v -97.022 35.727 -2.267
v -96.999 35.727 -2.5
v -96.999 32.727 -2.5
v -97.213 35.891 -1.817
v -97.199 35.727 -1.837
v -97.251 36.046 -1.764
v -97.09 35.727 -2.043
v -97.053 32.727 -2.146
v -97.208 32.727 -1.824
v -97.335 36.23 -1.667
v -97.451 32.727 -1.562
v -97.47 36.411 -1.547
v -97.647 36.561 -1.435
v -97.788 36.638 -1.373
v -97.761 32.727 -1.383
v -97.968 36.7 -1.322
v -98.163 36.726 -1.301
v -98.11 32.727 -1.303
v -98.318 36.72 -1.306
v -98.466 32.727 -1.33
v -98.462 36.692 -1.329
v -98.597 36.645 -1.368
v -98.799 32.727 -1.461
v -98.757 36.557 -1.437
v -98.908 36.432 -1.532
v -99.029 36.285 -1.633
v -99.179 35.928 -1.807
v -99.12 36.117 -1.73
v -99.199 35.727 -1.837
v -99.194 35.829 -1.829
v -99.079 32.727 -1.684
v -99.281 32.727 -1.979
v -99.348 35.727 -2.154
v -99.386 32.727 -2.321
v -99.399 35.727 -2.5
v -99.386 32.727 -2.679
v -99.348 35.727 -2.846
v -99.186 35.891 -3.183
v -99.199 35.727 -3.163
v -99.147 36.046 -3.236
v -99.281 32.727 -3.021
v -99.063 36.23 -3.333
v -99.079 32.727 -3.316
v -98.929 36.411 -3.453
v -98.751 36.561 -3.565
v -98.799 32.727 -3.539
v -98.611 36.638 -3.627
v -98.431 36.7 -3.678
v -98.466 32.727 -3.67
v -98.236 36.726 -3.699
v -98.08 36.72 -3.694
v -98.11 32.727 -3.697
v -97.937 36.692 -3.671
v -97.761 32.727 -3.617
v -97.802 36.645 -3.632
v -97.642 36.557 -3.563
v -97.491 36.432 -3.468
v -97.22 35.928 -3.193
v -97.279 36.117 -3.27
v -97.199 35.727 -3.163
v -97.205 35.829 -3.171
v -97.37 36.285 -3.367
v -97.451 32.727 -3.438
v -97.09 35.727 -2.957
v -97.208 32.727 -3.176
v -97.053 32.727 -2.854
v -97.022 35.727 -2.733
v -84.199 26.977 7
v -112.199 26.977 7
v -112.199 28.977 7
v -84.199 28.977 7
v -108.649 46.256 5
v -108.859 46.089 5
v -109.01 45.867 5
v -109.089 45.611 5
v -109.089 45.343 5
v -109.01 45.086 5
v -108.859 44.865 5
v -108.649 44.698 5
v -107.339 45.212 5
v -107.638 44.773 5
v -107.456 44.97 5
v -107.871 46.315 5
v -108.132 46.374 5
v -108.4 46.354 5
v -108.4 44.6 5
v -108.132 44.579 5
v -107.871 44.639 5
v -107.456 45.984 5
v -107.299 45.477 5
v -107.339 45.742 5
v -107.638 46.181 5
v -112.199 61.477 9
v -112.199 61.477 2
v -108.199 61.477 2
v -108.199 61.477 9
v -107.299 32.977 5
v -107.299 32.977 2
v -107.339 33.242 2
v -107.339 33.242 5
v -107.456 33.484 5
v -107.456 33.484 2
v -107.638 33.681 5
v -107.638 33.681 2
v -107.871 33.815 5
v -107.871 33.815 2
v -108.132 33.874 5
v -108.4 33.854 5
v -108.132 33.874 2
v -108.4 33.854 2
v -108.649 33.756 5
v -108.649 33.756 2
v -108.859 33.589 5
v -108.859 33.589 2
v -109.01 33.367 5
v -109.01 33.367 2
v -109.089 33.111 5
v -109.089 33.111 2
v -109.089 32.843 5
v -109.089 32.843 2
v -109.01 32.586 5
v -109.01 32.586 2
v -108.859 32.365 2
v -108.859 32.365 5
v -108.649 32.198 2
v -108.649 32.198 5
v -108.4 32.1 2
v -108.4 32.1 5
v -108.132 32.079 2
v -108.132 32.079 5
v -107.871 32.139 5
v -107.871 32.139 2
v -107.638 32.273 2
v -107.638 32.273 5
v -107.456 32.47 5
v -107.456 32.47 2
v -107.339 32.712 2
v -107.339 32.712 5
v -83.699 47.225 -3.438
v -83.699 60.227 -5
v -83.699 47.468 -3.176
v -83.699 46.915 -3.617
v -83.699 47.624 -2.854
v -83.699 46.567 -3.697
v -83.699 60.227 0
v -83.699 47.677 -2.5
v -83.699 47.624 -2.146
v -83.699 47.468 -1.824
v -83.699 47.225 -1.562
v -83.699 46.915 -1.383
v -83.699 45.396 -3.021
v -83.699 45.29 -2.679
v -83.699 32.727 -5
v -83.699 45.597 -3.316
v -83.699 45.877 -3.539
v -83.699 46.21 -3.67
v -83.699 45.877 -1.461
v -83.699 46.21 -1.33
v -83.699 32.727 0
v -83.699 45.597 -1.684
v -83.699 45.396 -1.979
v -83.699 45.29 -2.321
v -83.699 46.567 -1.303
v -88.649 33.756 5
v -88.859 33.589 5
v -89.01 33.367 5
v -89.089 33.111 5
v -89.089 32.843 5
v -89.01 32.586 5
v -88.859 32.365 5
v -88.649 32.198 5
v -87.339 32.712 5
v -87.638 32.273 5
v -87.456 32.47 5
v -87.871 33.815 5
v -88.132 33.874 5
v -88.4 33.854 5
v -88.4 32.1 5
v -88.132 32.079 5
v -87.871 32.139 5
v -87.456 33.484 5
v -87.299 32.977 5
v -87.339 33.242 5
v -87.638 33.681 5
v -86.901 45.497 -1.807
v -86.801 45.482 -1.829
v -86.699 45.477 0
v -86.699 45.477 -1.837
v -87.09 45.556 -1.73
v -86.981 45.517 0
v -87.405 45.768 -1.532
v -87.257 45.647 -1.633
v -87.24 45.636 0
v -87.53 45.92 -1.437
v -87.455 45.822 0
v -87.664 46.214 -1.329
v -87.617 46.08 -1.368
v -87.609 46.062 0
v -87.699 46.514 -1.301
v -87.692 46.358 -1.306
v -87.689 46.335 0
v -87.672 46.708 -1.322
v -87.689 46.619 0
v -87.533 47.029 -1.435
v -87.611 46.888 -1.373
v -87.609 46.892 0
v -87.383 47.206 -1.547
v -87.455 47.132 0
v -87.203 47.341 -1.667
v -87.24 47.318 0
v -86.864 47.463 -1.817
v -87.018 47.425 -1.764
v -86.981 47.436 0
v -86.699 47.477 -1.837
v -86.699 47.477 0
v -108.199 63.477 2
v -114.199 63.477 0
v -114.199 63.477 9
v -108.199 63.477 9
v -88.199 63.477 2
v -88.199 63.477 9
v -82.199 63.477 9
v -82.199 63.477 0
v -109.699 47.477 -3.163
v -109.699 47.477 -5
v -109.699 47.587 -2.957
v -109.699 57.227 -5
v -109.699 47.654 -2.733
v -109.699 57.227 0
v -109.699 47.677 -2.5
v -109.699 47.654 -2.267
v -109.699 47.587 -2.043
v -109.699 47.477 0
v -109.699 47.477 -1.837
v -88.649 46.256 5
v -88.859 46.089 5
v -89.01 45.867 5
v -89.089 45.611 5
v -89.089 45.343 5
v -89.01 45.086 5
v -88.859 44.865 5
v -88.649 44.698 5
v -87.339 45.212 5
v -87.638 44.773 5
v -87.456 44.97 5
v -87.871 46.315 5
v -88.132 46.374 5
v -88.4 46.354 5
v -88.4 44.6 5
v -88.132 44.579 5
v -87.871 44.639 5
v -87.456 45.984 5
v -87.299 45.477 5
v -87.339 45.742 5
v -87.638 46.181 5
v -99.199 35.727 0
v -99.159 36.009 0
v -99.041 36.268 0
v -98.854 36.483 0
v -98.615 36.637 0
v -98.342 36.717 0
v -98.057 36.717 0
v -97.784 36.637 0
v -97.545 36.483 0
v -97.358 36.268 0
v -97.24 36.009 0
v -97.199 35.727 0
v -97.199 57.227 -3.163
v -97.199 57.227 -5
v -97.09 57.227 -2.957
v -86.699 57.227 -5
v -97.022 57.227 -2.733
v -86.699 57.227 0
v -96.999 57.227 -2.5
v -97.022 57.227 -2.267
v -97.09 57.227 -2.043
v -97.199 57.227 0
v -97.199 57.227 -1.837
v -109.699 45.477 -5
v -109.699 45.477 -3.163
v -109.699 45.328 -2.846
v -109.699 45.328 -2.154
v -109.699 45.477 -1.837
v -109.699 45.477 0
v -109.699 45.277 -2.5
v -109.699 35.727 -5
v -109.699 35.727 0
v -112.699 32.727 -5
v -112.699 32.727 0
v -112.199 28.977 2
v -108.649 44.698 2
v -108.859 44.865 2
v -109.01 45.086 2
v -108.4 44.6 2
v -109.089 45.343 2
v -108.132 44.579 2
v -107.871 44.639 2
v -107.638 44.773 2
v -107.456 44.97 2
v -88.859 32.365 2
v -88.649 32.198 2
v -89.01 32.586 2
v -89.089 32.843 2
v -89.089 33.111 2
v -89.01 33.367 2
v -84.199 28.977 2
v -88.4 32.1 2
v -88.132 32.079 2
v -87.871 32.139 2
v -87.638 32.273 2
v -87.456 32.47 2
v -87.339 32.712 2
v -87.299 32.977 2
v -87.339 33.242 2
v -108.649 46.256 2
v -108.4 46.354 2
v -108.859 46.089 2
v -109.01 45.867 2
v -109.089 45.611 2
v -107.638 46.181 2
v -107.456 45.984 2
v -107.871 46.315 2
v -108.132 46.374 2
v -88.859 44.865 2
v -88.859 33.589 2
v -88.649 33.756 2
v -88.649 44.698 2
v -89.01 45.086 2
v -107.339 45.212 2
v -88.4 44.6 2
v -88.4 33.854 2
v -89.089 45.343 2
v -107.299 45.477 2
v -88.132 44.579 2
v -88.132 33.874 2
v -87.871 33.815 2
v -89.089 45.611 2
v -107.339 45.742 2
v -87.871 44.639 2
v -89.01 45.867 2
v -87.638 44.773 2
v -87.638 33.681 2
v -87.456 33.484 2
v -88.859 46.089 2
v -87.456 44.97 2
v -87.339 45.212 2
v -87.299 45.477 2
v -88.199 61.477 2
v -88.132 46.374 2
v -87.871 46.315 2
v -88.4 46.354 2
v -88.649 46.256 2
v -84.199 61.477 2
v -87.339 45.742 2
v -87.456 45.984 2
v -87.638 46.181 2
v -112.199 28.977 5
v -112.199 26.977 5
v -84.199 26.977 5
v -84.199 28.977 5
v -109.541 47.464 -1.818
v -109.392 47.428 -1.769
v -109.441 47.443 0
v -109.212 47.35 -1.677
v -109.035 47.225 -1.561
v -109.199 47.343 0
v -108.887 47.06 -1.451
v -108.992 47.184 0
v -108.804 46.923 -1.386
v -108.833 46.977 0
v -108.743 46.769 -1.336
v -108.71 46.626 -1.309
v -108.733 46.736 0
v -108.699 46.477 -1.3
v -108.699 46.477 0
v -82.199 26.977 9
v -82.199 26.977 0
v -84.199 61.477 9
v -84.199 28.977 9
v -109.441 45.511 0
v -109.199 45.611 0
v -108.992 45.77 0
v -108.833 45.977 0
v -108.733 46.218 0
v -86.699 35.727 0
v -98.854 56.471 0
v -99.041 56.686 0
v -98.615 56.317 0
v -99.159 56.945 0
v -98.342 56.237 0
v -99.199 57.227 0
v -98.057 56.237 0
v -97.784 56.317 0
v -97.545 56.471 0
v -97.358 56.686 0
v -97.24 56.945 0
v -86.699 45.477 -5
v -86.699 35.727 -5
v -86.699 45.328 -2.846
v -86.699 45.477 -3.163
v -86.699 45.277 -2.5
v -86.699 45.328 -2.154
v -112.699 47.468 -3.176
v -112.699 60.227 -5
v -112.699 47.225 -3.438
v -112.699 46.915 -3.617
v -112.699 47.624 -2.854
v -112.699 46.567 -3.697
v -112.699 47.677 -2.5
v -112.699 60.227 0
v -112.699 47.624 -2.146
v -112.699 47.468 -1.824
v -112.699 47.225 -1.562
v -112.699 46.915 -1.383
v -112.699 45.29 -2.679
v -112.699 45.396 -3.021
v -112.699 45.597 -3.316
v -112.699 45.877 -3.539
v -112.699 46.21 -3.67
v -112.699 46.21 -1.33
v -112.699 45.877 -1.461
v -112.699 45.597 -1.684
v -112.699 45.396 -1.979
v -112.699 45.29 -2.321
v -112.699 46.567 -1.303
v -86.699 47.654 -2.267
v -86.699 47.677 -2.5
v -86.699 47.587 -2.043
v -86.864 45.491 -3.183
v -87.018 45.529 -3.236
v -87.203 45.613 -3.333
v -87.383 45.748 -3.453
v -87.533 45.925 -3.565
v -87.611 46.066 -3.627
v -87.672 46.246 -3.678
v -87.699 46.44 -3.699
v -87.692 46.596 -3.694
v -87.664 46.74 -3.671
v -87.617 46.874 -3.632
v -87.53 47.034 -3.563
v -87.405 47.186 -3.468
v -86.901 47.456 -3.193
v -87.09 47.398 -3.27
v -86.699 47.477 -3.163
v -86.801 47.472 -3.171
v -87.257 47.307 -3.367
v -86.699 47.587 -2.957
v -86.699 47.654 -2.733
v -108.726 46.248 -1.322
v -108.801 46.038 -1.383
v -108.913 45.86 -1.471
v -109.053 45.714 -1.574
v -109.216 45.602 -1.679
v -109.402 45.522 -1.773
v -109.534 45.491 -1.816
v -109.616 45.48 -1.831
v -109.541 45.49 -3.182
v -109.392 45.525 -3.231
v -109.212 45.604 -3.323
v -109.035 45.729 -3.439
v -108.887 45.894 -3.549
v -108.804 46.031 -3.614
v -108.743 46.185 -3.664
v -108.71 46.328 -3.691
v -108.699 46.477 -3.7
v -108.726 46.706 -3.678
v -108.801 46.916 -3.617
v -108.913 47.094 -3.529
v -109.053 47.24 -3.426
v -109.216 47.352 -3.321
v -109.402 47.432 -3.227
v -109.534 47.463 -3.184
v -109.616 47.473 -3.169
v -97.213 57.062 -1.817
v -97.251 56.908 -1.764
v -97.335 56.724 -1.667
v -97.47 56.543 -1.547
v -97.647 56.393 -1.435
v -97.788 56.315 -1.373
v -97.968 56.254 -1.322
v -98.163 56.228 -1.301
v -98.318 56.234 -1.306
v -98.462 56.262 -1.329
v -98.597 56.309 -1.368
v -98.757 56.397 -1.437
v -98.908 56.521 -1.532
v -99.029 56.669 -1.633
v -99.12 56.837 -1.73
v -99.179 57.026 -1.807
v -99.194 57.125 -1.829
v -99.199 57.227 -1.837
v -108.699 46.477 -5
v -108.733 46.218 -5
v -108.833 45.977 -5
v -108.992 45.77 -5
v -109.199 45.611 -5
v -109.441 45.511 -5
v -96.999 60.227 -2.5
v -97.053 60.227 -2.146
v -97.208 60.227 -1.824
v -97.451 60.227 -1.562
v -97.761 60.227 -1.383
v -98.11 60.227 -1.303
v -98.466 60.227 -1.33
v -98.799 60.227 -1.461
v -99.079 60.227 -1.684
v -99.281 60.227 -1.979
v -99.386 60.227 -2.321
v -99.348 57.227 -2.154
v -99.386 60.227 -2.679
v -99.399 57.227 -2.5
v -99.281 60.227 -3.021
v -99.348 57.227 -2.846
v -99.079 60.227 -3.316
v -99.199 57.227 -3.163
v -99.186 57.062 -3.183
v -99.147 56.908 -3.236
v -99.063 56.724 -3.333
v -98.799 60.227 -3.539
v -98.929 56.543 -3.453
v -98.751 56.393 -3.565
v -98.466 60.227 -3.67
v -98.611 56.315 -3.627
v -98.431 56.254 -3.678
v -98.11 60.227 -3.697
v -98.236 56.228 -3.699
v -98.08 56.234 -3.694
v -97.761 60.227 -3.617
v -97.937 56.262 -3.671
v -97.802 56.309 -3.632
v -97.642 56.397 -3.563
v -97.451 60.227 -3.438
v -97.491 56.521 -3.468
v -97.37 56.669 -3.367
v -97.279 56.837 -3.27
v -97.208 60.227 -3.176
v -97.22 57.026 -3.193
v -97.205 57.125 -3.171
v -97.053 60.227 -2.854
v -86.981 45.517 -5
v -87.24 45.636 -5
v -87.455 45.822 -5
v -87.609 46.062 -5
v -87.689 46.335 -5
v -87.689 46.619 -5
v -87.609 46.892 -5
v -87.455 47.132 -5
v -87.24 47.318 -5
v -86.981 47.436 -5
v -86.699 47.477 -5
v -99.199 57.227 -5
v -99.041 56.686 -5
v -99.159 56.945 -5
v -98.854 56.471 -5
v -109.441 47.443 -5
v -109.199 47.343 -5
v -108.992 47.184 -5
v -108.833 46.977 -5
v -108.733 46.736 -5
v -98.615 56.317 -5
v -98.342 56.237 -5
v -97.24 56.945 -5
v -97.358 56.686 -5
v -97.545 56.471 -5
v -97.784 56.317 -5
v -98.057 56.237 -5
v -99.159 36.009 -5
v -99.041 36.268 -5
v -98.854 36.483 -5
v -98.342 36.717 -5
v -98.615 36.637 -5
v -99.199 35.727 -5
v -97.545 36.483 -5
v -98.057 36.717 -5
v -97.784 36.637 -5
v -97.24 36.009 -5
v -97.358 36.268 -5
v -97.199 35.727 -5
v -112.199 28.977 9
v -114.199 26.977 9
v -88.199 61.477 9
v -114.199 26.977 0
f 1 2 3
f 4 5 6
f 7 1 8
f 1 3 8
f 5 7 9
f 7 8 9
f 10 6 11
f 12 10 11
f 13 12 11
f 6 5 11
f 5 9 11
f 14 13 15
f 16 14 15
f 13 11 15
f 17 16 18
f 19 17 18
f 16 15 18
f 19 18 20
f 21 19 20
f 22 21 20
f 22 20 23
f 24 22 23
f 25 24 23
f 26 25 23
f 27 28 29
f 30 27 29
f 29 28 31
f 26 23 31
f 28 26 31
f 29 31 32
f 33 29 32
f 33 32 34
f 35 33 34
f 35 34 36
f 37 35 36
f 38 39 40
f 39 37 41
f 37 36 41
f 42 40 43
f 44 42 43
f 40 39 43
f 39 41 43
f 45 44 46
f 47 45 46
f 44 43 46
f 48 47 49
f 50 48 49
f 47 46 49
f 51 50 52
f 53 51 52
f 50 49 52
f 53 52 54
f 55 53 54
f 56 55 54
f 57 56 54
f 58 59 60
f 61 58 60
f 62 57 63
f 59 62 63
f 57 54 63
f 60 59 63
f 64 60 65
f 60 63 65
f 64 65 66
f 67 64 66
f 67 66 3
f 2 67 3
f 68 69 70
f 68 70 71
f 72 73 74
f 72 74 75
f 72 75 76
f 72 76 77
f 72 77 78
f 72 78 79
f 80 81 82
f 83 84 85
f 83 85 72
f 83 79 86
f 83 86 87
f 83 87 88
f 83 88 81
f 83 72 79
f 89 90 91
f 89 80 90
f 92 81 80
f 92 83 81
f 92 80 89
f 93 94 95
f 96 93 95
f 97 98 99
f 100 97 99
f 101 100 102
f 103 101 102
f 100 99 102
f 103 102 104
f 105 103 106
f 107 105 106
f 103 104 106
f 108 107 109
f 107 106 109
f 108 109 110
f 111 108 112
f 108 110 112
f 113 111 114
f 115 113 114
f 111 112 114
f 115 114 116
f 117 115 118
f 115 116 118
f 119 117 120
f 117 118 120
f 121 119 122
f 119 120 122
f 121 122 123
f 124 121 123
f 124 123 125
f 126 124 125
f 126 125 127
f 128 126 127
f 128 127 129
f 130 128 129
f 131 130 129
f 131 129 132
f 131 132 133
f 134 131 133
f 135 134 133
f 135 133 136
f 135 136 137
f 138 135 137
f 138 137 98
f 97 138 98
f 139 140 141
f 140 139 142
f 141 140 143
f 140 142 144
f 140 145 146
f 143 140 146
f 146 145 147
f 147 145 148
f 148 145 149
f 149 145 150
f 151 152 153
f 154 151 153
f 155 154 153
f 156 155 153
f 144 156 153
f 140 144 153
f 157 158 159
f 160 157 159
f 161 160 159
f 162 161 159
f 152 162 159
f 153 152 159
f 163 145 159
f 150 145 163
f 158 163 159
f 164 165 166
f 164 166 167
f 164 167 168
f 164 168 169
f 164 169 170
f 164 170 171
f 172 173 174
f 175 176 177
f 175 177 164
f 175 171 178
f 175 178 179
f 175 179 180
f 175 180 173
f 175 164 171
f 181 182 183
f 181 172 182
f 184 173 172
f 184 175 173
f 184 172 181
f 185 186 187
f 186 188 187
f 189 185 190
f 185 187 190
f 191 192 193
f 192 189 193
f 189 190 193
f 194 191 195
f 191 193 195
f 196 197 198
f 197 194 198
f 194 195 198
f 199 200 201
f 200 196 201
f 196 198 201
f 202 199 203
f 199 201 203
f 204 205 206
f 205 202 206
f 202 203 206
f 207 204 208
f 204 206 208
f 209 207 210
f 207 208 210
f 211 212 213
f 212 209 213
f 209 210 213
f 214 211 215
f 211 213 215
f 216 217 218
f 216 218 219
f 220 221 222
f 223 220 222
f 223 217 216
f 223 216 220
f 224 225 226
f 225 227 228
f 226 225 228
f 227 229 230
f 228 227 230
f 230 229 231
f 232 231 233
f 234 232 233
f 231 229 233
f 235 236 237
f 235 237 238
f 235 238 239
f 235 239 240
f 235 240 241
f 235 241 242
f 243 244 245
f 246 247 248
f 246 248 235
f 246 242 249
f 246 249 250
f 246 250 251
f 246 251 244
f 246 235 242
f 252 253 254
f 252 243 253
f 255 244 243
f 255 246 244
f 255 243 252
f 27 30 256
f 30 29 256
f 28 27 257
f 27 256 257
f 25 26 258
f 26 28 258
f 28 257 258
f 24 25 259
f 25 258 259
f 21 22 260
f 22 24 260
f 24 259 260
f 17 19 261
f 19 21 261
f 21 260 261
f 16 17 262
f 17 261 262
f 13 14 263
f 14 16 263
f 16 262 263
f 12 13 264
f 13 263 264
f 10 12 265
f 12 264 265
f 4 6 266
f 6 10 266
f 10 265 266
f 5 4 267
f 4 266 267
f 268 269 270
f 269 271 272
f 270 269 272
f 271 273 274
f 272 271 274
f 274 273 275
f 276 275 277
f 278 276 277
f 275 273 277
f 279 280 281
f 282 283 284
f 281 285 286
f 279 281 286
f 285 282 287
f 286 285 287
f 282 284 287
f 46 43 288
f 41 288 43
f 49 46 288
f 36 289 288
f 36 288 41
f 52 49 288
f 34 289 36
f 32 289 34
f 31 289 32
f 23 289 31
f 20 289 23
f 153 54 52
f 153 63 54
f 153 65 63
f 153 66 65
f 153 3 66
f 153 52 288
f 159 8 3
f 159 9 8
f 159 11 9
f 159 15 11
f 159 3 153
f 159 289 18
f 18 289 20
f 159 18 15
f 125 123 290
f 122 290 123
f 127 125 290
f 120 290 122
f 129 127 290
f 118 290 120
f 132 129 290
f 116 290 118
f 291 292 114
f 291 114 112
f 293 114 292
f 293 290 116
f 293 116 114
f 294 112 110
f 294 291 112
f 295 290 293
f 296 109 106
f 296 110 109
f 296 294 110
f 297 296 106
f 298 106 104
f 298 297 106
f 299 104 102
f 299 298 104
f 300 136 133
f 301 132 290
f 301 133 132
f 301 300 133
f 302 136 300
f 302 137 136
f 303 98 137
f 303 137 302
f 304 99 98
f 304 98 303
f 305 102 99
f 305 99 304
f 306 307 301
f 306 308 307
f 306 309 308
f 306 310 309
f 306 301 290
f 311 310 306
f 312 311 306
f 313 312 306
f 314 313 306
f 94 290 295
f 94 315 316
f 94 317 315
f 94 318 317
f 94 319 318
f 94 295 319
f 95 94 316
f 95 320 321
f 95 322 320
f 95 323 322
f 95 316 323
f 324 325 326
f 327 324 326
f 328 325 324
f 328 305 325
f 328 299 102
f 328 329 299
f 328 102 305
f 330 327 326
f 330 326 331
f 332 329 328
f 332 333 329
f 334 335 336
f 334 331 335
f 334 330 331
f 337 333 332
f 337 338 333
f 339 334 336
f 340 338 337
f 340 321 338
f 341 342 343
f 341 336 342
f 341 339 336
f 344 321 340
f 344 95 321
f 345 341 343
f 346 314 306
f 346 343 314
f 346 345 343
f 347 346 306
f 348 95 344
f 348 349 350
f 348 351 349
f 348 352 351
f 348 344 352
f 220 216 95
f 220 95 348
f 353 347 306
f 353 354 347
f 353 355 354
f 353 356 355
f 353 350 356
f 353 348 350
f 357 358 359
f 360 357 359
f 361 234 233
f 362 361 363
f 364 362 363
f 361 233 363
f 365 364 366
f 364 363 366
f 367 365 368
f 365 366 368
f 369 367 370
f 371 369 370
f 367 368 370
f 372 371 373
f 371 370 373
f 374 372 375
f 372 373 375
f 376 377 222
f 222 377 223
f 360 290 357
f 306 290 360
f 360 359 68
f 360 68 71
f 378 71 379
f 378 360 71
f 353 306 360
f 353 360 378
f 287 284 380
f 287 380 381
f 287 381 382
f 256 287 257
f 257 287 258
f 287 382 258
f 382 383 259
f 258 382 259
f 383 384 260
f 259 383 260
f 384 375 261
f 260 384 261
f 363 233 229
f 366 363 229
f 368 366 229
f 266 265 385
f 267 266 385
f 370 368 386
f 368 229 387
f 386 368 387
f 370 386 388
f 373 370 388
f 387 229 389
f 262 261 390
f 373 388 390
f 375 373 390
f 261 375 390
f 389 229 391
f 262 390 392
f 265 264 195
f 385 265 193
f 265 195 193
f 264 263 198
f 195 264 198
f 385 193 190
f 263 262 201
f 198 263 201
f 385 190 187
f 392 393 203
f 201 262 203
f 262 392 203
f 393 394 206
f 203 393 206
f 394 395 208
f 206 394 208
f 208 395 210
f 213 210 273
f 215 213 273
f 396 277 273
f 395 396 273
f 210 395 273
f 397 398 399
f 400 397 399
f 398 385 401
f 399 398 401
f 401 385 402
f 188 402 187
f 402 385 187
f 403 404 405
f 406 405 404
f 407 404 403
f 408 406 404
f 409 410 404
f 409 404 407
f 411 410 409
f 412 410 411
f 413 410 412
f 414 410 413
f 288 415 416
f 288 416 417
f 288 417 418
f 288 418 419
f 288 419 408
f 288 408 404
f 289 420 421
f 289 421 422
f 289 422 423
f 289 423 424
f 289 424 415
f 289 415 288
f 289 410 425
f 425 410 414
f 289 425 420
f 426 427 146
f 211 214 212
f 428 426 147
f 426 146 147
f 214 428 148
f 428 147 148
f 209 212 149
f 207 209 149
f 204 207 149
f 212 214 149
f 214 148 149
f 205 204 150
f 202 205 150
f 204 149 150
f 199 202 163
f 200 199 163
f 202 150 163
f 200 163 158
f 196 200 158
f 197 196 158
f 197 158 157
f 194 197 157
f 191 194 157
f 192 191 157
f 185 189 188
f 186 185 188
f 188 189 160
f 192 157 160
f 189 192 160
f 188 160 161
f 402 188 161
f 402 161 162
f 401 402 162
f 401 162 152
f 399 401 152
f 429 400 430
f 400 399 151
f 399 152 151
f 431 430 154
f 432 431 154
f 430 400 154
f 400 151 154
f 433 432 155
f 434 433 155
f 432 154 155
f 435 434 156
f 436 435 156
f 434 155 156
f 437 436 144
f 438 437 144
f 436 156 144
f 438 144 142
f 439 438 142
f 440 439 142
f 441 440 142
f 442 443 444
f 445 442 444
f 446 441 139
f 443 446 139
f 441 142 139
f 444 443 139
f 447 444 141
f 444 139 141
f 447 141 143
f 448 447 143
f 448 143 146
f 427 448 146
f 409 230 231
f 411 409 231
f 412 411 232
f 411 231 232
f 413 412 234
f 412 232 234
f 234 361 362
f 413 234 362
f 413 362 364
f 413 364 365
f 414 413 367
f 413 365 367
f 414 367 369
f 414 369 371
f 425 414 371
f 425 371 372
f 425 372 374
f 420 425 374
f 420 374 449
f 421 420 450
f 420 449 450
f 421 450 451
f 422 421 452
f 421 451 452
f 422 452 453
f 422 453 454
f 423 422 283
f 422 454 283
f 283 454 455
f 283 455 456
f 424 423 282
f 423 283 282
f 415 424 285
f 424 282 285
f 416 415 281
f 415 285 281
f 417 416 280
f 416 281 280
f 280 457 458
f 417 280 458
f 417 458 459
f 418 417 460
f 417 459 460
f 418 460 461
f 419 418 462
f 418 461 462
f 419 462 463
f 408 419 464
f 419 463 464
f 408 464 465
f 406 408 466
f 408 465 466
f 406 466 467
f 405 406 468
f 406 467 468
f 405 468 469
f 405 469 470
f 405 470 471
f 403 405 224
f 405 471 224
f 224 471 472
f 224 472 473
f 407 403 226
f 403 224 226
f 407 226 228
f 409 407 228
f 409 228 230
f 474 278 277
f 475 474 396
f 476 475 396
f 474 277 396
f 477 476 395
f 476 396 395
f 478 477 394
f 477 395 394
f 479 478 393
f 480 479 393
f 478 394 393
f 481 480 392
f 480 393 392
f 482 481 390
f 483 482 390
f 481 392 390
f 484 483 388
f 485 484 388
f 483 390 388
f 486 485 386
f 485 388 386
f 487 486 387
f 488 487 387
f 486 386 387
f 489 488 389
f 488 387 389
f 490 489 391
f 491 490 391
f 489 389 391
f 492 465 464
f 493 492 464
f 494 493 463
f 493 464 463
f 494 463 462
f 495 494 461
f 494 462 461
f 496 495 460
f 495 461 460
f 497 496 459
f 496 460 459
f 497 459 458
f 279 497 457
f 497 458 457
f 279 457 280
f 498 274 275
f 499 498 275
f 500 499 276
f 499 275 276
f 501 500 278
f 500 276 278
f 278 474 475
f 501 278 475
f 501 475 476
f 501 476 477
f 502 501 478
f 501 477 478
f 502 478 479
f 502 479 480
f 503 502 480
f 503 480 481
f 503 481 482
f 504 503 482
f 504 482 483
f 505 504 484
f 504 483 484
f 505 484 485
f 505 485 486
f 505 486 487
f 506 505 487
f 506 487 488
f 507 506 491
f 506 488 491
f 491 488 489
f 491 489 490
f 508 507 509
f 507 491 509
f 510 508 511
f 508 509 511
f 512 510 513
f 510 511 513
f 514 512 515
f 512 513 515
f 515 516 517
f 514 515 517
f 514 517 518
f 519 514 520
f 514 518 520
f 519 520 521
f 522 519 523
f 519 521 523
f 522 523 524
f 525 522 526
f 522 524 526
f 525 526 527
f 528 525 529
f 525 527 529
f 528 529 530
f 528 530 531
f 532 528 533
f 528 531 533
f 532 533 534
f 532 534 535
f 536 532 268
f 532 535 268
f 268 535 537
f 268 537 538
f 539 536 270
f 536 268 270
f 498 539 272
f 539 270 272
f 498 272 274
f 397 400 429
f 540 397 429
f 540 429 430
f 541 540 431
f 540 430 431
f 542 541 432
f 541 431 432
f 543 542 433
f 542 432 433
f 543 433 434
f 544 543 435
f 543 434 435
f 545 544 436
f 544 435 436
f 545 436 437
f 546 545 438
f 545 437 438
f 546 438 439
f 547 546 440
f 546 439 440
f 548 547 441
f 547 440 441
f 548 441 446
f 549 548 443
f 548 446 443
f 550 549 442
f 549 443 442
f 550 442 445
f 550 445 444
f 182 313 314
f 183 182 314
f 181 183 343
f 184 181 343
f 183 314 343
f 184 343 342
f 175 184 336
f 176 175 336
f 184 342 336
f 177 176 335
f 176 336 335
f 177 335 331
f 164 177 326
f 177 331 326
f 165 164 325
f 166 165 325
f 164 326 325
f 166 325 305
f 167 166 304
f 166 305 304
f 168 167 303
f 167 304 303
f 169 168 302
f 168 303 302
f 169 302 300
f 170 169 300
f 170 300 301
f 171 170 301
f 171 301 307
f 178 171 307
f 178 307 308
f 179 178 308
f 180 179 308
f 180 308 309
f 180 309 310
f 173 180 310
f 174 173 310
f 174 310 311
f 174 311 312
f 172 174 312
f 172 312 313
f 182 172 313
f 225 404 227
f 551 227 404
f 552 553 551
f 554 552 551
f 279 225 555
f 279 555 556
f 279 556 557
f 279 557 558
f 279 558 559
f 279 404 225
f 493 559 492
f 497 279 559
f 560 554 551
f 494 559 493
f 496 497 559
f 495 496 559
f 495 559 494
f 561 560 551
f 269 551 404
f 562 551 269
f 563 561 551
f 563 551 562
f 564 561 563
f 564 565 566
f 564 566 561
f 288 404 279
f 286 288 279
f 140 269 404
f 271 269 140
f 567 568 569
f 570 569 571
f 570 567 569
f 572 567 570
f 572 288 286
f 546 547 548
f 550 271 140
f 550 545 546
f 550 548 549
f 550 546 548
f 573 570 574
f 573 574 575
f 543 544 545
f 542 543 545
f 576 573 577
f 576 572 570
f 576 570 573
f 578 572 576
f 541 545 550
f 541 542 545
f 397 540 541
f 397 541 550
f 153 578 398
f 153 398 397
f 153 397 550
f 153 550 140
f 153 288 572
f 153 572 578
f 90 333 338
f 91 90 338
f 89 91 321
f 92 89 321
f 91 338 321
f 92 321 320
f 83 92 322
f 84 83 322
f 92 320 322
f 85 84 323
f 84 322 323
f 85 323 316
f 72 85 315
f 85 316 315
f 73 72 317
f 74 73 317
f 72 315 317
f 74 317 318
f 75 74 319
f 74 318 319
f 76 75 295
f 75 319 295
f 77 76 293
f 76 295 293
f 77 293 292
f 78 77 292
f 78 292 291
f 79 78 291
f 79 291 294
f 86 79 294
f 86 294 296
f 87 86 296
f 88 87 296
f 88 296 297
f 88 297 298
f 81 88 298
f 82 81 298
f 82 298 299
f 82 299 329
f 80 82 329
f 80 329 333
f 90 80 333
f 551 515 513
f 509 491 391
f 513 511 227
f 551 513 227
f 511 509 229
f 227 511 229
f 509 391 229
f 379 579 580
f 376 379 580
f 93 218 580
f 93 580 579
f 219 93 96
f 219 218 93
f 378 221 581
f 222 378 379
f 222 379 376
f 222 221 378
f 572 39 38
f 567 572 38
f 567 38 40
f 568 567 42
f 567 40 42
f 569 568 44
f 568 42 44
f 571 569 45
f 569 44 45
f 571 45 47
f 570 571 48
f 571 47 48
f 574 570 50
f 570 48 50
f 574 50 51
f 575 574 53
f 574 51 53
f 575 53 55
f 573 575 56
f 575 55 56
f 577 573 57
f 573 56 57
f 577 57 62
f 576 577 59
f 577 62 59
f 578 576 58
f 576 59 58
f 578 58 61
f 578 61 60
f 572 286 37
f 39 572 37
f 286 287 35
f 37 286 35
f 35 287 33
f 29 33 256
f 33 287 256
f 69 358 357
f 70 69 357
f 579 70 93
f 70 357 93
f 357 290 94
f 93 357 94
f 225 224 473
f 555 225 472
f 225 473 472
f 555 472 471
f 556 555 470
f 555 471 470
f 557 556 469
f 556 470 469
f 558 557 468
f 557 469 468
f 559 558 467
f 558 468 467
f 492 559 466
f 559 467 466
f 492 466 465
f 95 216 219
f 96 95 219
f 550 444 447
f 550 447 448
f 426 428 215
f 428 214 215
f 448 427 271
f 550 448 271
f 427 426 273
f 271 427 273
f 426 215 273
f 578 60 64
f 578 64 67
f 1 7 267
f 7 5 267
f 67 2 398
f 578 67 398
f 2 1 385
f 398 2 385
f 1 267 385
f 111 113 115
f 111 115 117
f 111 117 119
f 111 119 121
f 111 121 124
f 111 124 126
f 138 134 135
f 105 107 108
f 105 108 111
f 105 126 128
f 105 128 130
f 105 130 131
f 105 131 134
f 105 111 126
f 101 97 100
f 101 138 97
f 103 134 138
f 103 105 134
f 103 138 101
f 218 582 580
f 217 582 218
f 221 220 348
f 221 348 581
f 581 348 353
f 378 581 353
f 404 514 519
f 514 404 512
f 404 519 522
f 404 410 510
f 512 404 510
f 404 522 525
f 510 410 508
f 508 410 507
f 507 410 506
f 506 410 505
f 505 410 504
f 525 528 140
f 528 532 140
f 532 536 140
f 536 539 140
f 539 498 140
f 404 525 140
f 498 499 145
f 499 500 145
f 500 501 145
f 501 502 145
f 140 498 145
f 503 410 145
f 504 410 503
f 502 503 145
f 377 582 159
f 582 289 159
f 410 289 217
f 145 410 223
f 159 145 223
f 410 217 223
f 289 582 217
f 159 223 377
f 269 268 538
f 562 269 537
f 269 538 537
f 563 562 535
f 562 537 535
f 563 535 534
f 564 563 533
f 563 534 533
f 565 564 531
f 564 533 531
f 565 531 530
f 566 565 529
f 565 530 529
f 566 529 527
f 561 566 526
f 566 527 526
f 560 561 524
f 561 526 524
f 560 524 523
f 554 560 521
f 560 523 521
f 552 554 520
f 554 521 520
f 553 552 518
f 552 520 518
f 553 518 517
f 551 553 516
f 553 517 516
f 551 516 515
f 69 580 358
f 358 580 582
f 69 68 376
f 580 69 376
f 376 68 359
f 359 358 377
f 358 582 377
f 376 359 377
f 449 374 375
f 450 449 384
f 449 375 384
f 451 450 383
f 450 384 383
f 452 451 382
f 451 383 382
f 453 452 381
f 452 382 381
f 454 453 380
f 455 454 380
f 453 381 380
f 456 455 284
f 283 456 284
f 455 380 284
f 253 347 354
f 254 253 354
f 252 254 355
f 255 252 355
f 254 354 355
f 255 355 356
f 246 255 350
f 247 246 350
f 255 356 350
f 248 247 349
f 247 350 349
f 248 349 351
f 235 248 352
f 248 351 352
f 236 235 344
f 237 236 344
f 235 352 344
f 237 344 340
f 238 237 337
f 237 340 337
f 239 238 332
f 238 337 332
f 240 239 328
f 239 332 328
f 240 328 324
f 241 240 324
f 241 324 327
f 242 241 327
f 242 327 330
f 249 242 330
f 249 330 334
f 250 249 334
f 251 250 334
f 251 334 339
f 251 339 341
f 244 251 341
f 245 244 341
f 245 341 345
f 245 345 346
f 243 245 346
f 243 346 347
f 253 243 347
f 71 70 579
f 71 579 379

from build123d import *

# Parameters (mm, degrees)
F0_W     = 32
F0_H     = 36.5
F0_W_2   = 28
F0_H_2   = 32.5
F1_DEPTH = 9
F0_R     = 0.9
F2_DEPTH = 2
F3_DEPTH = 5
F4_W     = 28
F4_H     = 2
F5_DEPTH = 2
F6_W     = 20
F6_H     = 7
F7_DEPTH = 2
F8_W     = 29
F8_H     = 27.5
F9_DEPTH = 5
F11_D    = 2.4
F13_D    = 2.4


with BuildPart() as f1:
    # F0 (on Top) → F1 (new body)
    with BuildSketch(Plane.XY):
        with Locations((-98.1993639427, 45.2269401511)):
            Rectangle(F0_W, F0_H)
        with Locations((-98.1993639427, 45.2269401511)):
            Rectangle(F0_W_2, F0_H_2, mode=Mode.SUBTRACT)
    extrude(amount=F1_DEPTH)

    # F0 (on Top) → F2 (join)
    with BuildSketch(Plane.XY):
        with Locations((-98.1993639427, 45.2269401511)):
            Rectangle(F0_W_2, F0_H_2)
        with Locations((-108.1993639427, 32.9769401511)):
            Circle(F0_R, mode=Mode.SUBTRACT)
        with Locations((-88.1993639427, 32.9769401511)):
            Circle(F0_R, mode=Mode.SUBTRACT)
        with Locations((-108.1993639427, 45.4769401511)):
            Circle(F0_R, mode=Mode.SUBTRACT)
        with Locations((-88.1993639427, 45.4769401511)):
            Circle(F0_R, mode=Mode.SUBTRACT)
    extrude(amount=F2_DEPTH)

    # F0 (on Top) → F3 (join)
    with BuildSketch(Plane.XY):
        with Locations((-108.1993639427, 32.9769401511)):
            Circle(F0_R)
        with Locations((-108.1993639427, 45.4769401511)):
            Circle(F0_R)
        with Locations((-88.1993639427, 32.9769401511)):
            Circle(F0_R)
        with Locations((-88.1993639427, 45.4769401511)):
            Circle(F0_R)
    extrude(amount=F3_DEPTH)

    # F4 (on face) → F5 (cut, through all)
    with BuildSketch(Plane.XZ.offset(-26.9769401511)):
        with Locations((-98.1993639427, 6)):
            Rectangle(F4_W, F4_H)
    extrude(amount=-F5_DEPTH, mode=Mode.SUBTRACT)

    # F6 (on face) → F7 (cut, through all)
    with BuildSketch(Plane(origin=(0, 63.4769401511, 0), x_dir=(-1, 0, 0), z_dir=(0, 1, 0))):
        with Locations((98.1993639427, 5.5)):
            Rectangle(F6_W, F6_H)
    extrude(amount=-F7_DEPTH, mode=Mode.SUBTRACT)

    # F8 (on face) → F9 (join)
    with BuildSketch(Plane(origin=(0, 0, 0), x_dir=(1, 0, 0), z_dir=(0, 0, -1))):
        with Locations((-98.1993639427, -46.4769401511)):
            Rectangle(F8_W, F8_H)
        with BuildLine():
            ThreePointArc((-99.1993639427, -35.7269401511), (-98.1993639427, -34.7269401511), (-97.1993639427, -35.7269401511))
            Line((-97.1993639427, -35.7269401511), (-86.6993639427, -35.7269401511))
            Line((-86.6993639427, -35.7269401511), (-86.6993639427, -45.4769401511))
            ThreePointArc((-86.6993639427, -45.4769401511), (-85.9922571615, -45.7698333699), (-85.6993639427, -46.4769401511))
            ThreePointArc((-85.6993639427, -46.4769401511), (-85.9922571615, -47.1840469322), (-86.6993639427, -47.4769401511))
            Line((-86.6993639427, -47.4769401511), (-86.6993639427, -57.2269401511))
            Line((-86.6993639427, -57.2269401511), (-97.1993639427, -57.2269401511))
            ThreePointArc((-97.1993639427, -57.2269401511), (-98.1993639427, -58.2269401511), (-99.1993639427, -57.2269401511))
            Line((-99.1993639427, -57.2269401511), (-109.6993639427, -57.2269401511))
            Line((-109.6993639427, -57.2269401511), (-109.6993639427, -47.4769401511))
            ThreePointArc((-109.6993639427, -47.4769401511), (-110.6993639427, -46.4769401511), (-109.6993639427, -45.4769401511))
            Line((-109.6993639427, -45.4769401511), (-109.6993639427, -35.7269401511))
            Line((-109.6993639427, -35.7269401511), (-99.1993639427, -35.7269401511))
        make_face(mode=Mode.SUBTRACT)
        with BuildLine():
            Line((-86.6993639427, -47.4769401511), (-86.6993639427, -45.4769401511))
            ThreePointArc((-86.6993639427, -45.4769401511), (-87.6993639427, -46.4769401511), (-86.6993639427, -47.4769401511))
        make_face()
        with BuildLine():
            ThreePointArc((-85.6993639427, -46.4769401511), (-85.9922571615, -45.7698333699), (-86.6993639427, -45.4769401511))
            Line((-86.6993639427, -45.4769401511), (-86.6993639427, -47.4769401511))
            ThreePointArc((-86.6993639427, -47.4769401511), (-85.9922571615, -47.1840469322), (-85.6993639427, -46.4769401511))
        make_face()
        with BuildLine():
            Line((-99.1993639427, -35.7269401511), (-97.1993639427, -35.7269401511))
            ThreePointArc((-97.1993639427, -35.7269401511), (-98.1993639427, -34.7269401511), (-99.1993639427, -35.7269401511))
        make_face()
        with BuildLine():
            ThreePointArc((-99.1993639427, -35.7269401511), (-98.1993639427, -36.7269401511), (-97.1993639427, -35.7269401511))
            Line((-97.1993639427, -35.7269401511), (-99.1993639427, -35.7269401511))
        make_face()
        with BuildLine():
            ThreePointArc((-108.6993639427, -46.4769401511), (-108.9922571615, -45.7698333699), (-109.6993639427, -45.4769401511))
            Line((-109.6993639427, -45.4769401511), (-109.6993639427, -47.4769401511))
            ThreePointArc((-109.6993639427, -47.4769401511), (-108.9922571615, -47.1840469322), (-108.6993639427, -46.4769401511))
        make_face()
        with BuildLine():
            Line((-109.6993639427, -47.4769401511), (-109.6993639427, -45.4769401511))
            ThreePointArc((-109.6993639427, -45.4769401511), (-110.6993639427, -46.4769401511), (-109.6993639427, -47.4769401511))
        make_face()
        with BuildLine():
            Line((-99.1993639427, -57.2269401511), (-97.1993639427, -57.2269401511))
            ThreePointArc((-97.1993639427, -57.2269401511), (-98.1993639427, -56.2269401511), (-99.1993639427, -57.2269401511))
        make_face()
        with BuildLine():
            ThreePointArc((-99.1993639427, -57.2269401511), (-98.1993639427, -58.2269401511), (-97.1993639427, -57.2269401511))
            Line((-97.1993639427, -57.2269401511), (-99.1993639427, -57.2269401511))
        make_face()
    extrude(amount=F9_DEPTH)

    # F11 (through all)
    with Locations(Plane(origin=(0, 60.2269401511, 0), x_dir=(-1, 0, 0), z_dir=(0, 1, 0))):
        with Locations((98.1993639427, -2.5)):
            Hole(F11_D / 2)

    # F13 (through all)
    with Locations(Plane(origin=(-112.6993639427, 0, 0), x_dir=(0, -1, 0), z_dir=(-1, 0, 0))):
        with Locations((-46.4769401511, -2.5)):
            Hole(F13_D / 2)


solid = f1.part
